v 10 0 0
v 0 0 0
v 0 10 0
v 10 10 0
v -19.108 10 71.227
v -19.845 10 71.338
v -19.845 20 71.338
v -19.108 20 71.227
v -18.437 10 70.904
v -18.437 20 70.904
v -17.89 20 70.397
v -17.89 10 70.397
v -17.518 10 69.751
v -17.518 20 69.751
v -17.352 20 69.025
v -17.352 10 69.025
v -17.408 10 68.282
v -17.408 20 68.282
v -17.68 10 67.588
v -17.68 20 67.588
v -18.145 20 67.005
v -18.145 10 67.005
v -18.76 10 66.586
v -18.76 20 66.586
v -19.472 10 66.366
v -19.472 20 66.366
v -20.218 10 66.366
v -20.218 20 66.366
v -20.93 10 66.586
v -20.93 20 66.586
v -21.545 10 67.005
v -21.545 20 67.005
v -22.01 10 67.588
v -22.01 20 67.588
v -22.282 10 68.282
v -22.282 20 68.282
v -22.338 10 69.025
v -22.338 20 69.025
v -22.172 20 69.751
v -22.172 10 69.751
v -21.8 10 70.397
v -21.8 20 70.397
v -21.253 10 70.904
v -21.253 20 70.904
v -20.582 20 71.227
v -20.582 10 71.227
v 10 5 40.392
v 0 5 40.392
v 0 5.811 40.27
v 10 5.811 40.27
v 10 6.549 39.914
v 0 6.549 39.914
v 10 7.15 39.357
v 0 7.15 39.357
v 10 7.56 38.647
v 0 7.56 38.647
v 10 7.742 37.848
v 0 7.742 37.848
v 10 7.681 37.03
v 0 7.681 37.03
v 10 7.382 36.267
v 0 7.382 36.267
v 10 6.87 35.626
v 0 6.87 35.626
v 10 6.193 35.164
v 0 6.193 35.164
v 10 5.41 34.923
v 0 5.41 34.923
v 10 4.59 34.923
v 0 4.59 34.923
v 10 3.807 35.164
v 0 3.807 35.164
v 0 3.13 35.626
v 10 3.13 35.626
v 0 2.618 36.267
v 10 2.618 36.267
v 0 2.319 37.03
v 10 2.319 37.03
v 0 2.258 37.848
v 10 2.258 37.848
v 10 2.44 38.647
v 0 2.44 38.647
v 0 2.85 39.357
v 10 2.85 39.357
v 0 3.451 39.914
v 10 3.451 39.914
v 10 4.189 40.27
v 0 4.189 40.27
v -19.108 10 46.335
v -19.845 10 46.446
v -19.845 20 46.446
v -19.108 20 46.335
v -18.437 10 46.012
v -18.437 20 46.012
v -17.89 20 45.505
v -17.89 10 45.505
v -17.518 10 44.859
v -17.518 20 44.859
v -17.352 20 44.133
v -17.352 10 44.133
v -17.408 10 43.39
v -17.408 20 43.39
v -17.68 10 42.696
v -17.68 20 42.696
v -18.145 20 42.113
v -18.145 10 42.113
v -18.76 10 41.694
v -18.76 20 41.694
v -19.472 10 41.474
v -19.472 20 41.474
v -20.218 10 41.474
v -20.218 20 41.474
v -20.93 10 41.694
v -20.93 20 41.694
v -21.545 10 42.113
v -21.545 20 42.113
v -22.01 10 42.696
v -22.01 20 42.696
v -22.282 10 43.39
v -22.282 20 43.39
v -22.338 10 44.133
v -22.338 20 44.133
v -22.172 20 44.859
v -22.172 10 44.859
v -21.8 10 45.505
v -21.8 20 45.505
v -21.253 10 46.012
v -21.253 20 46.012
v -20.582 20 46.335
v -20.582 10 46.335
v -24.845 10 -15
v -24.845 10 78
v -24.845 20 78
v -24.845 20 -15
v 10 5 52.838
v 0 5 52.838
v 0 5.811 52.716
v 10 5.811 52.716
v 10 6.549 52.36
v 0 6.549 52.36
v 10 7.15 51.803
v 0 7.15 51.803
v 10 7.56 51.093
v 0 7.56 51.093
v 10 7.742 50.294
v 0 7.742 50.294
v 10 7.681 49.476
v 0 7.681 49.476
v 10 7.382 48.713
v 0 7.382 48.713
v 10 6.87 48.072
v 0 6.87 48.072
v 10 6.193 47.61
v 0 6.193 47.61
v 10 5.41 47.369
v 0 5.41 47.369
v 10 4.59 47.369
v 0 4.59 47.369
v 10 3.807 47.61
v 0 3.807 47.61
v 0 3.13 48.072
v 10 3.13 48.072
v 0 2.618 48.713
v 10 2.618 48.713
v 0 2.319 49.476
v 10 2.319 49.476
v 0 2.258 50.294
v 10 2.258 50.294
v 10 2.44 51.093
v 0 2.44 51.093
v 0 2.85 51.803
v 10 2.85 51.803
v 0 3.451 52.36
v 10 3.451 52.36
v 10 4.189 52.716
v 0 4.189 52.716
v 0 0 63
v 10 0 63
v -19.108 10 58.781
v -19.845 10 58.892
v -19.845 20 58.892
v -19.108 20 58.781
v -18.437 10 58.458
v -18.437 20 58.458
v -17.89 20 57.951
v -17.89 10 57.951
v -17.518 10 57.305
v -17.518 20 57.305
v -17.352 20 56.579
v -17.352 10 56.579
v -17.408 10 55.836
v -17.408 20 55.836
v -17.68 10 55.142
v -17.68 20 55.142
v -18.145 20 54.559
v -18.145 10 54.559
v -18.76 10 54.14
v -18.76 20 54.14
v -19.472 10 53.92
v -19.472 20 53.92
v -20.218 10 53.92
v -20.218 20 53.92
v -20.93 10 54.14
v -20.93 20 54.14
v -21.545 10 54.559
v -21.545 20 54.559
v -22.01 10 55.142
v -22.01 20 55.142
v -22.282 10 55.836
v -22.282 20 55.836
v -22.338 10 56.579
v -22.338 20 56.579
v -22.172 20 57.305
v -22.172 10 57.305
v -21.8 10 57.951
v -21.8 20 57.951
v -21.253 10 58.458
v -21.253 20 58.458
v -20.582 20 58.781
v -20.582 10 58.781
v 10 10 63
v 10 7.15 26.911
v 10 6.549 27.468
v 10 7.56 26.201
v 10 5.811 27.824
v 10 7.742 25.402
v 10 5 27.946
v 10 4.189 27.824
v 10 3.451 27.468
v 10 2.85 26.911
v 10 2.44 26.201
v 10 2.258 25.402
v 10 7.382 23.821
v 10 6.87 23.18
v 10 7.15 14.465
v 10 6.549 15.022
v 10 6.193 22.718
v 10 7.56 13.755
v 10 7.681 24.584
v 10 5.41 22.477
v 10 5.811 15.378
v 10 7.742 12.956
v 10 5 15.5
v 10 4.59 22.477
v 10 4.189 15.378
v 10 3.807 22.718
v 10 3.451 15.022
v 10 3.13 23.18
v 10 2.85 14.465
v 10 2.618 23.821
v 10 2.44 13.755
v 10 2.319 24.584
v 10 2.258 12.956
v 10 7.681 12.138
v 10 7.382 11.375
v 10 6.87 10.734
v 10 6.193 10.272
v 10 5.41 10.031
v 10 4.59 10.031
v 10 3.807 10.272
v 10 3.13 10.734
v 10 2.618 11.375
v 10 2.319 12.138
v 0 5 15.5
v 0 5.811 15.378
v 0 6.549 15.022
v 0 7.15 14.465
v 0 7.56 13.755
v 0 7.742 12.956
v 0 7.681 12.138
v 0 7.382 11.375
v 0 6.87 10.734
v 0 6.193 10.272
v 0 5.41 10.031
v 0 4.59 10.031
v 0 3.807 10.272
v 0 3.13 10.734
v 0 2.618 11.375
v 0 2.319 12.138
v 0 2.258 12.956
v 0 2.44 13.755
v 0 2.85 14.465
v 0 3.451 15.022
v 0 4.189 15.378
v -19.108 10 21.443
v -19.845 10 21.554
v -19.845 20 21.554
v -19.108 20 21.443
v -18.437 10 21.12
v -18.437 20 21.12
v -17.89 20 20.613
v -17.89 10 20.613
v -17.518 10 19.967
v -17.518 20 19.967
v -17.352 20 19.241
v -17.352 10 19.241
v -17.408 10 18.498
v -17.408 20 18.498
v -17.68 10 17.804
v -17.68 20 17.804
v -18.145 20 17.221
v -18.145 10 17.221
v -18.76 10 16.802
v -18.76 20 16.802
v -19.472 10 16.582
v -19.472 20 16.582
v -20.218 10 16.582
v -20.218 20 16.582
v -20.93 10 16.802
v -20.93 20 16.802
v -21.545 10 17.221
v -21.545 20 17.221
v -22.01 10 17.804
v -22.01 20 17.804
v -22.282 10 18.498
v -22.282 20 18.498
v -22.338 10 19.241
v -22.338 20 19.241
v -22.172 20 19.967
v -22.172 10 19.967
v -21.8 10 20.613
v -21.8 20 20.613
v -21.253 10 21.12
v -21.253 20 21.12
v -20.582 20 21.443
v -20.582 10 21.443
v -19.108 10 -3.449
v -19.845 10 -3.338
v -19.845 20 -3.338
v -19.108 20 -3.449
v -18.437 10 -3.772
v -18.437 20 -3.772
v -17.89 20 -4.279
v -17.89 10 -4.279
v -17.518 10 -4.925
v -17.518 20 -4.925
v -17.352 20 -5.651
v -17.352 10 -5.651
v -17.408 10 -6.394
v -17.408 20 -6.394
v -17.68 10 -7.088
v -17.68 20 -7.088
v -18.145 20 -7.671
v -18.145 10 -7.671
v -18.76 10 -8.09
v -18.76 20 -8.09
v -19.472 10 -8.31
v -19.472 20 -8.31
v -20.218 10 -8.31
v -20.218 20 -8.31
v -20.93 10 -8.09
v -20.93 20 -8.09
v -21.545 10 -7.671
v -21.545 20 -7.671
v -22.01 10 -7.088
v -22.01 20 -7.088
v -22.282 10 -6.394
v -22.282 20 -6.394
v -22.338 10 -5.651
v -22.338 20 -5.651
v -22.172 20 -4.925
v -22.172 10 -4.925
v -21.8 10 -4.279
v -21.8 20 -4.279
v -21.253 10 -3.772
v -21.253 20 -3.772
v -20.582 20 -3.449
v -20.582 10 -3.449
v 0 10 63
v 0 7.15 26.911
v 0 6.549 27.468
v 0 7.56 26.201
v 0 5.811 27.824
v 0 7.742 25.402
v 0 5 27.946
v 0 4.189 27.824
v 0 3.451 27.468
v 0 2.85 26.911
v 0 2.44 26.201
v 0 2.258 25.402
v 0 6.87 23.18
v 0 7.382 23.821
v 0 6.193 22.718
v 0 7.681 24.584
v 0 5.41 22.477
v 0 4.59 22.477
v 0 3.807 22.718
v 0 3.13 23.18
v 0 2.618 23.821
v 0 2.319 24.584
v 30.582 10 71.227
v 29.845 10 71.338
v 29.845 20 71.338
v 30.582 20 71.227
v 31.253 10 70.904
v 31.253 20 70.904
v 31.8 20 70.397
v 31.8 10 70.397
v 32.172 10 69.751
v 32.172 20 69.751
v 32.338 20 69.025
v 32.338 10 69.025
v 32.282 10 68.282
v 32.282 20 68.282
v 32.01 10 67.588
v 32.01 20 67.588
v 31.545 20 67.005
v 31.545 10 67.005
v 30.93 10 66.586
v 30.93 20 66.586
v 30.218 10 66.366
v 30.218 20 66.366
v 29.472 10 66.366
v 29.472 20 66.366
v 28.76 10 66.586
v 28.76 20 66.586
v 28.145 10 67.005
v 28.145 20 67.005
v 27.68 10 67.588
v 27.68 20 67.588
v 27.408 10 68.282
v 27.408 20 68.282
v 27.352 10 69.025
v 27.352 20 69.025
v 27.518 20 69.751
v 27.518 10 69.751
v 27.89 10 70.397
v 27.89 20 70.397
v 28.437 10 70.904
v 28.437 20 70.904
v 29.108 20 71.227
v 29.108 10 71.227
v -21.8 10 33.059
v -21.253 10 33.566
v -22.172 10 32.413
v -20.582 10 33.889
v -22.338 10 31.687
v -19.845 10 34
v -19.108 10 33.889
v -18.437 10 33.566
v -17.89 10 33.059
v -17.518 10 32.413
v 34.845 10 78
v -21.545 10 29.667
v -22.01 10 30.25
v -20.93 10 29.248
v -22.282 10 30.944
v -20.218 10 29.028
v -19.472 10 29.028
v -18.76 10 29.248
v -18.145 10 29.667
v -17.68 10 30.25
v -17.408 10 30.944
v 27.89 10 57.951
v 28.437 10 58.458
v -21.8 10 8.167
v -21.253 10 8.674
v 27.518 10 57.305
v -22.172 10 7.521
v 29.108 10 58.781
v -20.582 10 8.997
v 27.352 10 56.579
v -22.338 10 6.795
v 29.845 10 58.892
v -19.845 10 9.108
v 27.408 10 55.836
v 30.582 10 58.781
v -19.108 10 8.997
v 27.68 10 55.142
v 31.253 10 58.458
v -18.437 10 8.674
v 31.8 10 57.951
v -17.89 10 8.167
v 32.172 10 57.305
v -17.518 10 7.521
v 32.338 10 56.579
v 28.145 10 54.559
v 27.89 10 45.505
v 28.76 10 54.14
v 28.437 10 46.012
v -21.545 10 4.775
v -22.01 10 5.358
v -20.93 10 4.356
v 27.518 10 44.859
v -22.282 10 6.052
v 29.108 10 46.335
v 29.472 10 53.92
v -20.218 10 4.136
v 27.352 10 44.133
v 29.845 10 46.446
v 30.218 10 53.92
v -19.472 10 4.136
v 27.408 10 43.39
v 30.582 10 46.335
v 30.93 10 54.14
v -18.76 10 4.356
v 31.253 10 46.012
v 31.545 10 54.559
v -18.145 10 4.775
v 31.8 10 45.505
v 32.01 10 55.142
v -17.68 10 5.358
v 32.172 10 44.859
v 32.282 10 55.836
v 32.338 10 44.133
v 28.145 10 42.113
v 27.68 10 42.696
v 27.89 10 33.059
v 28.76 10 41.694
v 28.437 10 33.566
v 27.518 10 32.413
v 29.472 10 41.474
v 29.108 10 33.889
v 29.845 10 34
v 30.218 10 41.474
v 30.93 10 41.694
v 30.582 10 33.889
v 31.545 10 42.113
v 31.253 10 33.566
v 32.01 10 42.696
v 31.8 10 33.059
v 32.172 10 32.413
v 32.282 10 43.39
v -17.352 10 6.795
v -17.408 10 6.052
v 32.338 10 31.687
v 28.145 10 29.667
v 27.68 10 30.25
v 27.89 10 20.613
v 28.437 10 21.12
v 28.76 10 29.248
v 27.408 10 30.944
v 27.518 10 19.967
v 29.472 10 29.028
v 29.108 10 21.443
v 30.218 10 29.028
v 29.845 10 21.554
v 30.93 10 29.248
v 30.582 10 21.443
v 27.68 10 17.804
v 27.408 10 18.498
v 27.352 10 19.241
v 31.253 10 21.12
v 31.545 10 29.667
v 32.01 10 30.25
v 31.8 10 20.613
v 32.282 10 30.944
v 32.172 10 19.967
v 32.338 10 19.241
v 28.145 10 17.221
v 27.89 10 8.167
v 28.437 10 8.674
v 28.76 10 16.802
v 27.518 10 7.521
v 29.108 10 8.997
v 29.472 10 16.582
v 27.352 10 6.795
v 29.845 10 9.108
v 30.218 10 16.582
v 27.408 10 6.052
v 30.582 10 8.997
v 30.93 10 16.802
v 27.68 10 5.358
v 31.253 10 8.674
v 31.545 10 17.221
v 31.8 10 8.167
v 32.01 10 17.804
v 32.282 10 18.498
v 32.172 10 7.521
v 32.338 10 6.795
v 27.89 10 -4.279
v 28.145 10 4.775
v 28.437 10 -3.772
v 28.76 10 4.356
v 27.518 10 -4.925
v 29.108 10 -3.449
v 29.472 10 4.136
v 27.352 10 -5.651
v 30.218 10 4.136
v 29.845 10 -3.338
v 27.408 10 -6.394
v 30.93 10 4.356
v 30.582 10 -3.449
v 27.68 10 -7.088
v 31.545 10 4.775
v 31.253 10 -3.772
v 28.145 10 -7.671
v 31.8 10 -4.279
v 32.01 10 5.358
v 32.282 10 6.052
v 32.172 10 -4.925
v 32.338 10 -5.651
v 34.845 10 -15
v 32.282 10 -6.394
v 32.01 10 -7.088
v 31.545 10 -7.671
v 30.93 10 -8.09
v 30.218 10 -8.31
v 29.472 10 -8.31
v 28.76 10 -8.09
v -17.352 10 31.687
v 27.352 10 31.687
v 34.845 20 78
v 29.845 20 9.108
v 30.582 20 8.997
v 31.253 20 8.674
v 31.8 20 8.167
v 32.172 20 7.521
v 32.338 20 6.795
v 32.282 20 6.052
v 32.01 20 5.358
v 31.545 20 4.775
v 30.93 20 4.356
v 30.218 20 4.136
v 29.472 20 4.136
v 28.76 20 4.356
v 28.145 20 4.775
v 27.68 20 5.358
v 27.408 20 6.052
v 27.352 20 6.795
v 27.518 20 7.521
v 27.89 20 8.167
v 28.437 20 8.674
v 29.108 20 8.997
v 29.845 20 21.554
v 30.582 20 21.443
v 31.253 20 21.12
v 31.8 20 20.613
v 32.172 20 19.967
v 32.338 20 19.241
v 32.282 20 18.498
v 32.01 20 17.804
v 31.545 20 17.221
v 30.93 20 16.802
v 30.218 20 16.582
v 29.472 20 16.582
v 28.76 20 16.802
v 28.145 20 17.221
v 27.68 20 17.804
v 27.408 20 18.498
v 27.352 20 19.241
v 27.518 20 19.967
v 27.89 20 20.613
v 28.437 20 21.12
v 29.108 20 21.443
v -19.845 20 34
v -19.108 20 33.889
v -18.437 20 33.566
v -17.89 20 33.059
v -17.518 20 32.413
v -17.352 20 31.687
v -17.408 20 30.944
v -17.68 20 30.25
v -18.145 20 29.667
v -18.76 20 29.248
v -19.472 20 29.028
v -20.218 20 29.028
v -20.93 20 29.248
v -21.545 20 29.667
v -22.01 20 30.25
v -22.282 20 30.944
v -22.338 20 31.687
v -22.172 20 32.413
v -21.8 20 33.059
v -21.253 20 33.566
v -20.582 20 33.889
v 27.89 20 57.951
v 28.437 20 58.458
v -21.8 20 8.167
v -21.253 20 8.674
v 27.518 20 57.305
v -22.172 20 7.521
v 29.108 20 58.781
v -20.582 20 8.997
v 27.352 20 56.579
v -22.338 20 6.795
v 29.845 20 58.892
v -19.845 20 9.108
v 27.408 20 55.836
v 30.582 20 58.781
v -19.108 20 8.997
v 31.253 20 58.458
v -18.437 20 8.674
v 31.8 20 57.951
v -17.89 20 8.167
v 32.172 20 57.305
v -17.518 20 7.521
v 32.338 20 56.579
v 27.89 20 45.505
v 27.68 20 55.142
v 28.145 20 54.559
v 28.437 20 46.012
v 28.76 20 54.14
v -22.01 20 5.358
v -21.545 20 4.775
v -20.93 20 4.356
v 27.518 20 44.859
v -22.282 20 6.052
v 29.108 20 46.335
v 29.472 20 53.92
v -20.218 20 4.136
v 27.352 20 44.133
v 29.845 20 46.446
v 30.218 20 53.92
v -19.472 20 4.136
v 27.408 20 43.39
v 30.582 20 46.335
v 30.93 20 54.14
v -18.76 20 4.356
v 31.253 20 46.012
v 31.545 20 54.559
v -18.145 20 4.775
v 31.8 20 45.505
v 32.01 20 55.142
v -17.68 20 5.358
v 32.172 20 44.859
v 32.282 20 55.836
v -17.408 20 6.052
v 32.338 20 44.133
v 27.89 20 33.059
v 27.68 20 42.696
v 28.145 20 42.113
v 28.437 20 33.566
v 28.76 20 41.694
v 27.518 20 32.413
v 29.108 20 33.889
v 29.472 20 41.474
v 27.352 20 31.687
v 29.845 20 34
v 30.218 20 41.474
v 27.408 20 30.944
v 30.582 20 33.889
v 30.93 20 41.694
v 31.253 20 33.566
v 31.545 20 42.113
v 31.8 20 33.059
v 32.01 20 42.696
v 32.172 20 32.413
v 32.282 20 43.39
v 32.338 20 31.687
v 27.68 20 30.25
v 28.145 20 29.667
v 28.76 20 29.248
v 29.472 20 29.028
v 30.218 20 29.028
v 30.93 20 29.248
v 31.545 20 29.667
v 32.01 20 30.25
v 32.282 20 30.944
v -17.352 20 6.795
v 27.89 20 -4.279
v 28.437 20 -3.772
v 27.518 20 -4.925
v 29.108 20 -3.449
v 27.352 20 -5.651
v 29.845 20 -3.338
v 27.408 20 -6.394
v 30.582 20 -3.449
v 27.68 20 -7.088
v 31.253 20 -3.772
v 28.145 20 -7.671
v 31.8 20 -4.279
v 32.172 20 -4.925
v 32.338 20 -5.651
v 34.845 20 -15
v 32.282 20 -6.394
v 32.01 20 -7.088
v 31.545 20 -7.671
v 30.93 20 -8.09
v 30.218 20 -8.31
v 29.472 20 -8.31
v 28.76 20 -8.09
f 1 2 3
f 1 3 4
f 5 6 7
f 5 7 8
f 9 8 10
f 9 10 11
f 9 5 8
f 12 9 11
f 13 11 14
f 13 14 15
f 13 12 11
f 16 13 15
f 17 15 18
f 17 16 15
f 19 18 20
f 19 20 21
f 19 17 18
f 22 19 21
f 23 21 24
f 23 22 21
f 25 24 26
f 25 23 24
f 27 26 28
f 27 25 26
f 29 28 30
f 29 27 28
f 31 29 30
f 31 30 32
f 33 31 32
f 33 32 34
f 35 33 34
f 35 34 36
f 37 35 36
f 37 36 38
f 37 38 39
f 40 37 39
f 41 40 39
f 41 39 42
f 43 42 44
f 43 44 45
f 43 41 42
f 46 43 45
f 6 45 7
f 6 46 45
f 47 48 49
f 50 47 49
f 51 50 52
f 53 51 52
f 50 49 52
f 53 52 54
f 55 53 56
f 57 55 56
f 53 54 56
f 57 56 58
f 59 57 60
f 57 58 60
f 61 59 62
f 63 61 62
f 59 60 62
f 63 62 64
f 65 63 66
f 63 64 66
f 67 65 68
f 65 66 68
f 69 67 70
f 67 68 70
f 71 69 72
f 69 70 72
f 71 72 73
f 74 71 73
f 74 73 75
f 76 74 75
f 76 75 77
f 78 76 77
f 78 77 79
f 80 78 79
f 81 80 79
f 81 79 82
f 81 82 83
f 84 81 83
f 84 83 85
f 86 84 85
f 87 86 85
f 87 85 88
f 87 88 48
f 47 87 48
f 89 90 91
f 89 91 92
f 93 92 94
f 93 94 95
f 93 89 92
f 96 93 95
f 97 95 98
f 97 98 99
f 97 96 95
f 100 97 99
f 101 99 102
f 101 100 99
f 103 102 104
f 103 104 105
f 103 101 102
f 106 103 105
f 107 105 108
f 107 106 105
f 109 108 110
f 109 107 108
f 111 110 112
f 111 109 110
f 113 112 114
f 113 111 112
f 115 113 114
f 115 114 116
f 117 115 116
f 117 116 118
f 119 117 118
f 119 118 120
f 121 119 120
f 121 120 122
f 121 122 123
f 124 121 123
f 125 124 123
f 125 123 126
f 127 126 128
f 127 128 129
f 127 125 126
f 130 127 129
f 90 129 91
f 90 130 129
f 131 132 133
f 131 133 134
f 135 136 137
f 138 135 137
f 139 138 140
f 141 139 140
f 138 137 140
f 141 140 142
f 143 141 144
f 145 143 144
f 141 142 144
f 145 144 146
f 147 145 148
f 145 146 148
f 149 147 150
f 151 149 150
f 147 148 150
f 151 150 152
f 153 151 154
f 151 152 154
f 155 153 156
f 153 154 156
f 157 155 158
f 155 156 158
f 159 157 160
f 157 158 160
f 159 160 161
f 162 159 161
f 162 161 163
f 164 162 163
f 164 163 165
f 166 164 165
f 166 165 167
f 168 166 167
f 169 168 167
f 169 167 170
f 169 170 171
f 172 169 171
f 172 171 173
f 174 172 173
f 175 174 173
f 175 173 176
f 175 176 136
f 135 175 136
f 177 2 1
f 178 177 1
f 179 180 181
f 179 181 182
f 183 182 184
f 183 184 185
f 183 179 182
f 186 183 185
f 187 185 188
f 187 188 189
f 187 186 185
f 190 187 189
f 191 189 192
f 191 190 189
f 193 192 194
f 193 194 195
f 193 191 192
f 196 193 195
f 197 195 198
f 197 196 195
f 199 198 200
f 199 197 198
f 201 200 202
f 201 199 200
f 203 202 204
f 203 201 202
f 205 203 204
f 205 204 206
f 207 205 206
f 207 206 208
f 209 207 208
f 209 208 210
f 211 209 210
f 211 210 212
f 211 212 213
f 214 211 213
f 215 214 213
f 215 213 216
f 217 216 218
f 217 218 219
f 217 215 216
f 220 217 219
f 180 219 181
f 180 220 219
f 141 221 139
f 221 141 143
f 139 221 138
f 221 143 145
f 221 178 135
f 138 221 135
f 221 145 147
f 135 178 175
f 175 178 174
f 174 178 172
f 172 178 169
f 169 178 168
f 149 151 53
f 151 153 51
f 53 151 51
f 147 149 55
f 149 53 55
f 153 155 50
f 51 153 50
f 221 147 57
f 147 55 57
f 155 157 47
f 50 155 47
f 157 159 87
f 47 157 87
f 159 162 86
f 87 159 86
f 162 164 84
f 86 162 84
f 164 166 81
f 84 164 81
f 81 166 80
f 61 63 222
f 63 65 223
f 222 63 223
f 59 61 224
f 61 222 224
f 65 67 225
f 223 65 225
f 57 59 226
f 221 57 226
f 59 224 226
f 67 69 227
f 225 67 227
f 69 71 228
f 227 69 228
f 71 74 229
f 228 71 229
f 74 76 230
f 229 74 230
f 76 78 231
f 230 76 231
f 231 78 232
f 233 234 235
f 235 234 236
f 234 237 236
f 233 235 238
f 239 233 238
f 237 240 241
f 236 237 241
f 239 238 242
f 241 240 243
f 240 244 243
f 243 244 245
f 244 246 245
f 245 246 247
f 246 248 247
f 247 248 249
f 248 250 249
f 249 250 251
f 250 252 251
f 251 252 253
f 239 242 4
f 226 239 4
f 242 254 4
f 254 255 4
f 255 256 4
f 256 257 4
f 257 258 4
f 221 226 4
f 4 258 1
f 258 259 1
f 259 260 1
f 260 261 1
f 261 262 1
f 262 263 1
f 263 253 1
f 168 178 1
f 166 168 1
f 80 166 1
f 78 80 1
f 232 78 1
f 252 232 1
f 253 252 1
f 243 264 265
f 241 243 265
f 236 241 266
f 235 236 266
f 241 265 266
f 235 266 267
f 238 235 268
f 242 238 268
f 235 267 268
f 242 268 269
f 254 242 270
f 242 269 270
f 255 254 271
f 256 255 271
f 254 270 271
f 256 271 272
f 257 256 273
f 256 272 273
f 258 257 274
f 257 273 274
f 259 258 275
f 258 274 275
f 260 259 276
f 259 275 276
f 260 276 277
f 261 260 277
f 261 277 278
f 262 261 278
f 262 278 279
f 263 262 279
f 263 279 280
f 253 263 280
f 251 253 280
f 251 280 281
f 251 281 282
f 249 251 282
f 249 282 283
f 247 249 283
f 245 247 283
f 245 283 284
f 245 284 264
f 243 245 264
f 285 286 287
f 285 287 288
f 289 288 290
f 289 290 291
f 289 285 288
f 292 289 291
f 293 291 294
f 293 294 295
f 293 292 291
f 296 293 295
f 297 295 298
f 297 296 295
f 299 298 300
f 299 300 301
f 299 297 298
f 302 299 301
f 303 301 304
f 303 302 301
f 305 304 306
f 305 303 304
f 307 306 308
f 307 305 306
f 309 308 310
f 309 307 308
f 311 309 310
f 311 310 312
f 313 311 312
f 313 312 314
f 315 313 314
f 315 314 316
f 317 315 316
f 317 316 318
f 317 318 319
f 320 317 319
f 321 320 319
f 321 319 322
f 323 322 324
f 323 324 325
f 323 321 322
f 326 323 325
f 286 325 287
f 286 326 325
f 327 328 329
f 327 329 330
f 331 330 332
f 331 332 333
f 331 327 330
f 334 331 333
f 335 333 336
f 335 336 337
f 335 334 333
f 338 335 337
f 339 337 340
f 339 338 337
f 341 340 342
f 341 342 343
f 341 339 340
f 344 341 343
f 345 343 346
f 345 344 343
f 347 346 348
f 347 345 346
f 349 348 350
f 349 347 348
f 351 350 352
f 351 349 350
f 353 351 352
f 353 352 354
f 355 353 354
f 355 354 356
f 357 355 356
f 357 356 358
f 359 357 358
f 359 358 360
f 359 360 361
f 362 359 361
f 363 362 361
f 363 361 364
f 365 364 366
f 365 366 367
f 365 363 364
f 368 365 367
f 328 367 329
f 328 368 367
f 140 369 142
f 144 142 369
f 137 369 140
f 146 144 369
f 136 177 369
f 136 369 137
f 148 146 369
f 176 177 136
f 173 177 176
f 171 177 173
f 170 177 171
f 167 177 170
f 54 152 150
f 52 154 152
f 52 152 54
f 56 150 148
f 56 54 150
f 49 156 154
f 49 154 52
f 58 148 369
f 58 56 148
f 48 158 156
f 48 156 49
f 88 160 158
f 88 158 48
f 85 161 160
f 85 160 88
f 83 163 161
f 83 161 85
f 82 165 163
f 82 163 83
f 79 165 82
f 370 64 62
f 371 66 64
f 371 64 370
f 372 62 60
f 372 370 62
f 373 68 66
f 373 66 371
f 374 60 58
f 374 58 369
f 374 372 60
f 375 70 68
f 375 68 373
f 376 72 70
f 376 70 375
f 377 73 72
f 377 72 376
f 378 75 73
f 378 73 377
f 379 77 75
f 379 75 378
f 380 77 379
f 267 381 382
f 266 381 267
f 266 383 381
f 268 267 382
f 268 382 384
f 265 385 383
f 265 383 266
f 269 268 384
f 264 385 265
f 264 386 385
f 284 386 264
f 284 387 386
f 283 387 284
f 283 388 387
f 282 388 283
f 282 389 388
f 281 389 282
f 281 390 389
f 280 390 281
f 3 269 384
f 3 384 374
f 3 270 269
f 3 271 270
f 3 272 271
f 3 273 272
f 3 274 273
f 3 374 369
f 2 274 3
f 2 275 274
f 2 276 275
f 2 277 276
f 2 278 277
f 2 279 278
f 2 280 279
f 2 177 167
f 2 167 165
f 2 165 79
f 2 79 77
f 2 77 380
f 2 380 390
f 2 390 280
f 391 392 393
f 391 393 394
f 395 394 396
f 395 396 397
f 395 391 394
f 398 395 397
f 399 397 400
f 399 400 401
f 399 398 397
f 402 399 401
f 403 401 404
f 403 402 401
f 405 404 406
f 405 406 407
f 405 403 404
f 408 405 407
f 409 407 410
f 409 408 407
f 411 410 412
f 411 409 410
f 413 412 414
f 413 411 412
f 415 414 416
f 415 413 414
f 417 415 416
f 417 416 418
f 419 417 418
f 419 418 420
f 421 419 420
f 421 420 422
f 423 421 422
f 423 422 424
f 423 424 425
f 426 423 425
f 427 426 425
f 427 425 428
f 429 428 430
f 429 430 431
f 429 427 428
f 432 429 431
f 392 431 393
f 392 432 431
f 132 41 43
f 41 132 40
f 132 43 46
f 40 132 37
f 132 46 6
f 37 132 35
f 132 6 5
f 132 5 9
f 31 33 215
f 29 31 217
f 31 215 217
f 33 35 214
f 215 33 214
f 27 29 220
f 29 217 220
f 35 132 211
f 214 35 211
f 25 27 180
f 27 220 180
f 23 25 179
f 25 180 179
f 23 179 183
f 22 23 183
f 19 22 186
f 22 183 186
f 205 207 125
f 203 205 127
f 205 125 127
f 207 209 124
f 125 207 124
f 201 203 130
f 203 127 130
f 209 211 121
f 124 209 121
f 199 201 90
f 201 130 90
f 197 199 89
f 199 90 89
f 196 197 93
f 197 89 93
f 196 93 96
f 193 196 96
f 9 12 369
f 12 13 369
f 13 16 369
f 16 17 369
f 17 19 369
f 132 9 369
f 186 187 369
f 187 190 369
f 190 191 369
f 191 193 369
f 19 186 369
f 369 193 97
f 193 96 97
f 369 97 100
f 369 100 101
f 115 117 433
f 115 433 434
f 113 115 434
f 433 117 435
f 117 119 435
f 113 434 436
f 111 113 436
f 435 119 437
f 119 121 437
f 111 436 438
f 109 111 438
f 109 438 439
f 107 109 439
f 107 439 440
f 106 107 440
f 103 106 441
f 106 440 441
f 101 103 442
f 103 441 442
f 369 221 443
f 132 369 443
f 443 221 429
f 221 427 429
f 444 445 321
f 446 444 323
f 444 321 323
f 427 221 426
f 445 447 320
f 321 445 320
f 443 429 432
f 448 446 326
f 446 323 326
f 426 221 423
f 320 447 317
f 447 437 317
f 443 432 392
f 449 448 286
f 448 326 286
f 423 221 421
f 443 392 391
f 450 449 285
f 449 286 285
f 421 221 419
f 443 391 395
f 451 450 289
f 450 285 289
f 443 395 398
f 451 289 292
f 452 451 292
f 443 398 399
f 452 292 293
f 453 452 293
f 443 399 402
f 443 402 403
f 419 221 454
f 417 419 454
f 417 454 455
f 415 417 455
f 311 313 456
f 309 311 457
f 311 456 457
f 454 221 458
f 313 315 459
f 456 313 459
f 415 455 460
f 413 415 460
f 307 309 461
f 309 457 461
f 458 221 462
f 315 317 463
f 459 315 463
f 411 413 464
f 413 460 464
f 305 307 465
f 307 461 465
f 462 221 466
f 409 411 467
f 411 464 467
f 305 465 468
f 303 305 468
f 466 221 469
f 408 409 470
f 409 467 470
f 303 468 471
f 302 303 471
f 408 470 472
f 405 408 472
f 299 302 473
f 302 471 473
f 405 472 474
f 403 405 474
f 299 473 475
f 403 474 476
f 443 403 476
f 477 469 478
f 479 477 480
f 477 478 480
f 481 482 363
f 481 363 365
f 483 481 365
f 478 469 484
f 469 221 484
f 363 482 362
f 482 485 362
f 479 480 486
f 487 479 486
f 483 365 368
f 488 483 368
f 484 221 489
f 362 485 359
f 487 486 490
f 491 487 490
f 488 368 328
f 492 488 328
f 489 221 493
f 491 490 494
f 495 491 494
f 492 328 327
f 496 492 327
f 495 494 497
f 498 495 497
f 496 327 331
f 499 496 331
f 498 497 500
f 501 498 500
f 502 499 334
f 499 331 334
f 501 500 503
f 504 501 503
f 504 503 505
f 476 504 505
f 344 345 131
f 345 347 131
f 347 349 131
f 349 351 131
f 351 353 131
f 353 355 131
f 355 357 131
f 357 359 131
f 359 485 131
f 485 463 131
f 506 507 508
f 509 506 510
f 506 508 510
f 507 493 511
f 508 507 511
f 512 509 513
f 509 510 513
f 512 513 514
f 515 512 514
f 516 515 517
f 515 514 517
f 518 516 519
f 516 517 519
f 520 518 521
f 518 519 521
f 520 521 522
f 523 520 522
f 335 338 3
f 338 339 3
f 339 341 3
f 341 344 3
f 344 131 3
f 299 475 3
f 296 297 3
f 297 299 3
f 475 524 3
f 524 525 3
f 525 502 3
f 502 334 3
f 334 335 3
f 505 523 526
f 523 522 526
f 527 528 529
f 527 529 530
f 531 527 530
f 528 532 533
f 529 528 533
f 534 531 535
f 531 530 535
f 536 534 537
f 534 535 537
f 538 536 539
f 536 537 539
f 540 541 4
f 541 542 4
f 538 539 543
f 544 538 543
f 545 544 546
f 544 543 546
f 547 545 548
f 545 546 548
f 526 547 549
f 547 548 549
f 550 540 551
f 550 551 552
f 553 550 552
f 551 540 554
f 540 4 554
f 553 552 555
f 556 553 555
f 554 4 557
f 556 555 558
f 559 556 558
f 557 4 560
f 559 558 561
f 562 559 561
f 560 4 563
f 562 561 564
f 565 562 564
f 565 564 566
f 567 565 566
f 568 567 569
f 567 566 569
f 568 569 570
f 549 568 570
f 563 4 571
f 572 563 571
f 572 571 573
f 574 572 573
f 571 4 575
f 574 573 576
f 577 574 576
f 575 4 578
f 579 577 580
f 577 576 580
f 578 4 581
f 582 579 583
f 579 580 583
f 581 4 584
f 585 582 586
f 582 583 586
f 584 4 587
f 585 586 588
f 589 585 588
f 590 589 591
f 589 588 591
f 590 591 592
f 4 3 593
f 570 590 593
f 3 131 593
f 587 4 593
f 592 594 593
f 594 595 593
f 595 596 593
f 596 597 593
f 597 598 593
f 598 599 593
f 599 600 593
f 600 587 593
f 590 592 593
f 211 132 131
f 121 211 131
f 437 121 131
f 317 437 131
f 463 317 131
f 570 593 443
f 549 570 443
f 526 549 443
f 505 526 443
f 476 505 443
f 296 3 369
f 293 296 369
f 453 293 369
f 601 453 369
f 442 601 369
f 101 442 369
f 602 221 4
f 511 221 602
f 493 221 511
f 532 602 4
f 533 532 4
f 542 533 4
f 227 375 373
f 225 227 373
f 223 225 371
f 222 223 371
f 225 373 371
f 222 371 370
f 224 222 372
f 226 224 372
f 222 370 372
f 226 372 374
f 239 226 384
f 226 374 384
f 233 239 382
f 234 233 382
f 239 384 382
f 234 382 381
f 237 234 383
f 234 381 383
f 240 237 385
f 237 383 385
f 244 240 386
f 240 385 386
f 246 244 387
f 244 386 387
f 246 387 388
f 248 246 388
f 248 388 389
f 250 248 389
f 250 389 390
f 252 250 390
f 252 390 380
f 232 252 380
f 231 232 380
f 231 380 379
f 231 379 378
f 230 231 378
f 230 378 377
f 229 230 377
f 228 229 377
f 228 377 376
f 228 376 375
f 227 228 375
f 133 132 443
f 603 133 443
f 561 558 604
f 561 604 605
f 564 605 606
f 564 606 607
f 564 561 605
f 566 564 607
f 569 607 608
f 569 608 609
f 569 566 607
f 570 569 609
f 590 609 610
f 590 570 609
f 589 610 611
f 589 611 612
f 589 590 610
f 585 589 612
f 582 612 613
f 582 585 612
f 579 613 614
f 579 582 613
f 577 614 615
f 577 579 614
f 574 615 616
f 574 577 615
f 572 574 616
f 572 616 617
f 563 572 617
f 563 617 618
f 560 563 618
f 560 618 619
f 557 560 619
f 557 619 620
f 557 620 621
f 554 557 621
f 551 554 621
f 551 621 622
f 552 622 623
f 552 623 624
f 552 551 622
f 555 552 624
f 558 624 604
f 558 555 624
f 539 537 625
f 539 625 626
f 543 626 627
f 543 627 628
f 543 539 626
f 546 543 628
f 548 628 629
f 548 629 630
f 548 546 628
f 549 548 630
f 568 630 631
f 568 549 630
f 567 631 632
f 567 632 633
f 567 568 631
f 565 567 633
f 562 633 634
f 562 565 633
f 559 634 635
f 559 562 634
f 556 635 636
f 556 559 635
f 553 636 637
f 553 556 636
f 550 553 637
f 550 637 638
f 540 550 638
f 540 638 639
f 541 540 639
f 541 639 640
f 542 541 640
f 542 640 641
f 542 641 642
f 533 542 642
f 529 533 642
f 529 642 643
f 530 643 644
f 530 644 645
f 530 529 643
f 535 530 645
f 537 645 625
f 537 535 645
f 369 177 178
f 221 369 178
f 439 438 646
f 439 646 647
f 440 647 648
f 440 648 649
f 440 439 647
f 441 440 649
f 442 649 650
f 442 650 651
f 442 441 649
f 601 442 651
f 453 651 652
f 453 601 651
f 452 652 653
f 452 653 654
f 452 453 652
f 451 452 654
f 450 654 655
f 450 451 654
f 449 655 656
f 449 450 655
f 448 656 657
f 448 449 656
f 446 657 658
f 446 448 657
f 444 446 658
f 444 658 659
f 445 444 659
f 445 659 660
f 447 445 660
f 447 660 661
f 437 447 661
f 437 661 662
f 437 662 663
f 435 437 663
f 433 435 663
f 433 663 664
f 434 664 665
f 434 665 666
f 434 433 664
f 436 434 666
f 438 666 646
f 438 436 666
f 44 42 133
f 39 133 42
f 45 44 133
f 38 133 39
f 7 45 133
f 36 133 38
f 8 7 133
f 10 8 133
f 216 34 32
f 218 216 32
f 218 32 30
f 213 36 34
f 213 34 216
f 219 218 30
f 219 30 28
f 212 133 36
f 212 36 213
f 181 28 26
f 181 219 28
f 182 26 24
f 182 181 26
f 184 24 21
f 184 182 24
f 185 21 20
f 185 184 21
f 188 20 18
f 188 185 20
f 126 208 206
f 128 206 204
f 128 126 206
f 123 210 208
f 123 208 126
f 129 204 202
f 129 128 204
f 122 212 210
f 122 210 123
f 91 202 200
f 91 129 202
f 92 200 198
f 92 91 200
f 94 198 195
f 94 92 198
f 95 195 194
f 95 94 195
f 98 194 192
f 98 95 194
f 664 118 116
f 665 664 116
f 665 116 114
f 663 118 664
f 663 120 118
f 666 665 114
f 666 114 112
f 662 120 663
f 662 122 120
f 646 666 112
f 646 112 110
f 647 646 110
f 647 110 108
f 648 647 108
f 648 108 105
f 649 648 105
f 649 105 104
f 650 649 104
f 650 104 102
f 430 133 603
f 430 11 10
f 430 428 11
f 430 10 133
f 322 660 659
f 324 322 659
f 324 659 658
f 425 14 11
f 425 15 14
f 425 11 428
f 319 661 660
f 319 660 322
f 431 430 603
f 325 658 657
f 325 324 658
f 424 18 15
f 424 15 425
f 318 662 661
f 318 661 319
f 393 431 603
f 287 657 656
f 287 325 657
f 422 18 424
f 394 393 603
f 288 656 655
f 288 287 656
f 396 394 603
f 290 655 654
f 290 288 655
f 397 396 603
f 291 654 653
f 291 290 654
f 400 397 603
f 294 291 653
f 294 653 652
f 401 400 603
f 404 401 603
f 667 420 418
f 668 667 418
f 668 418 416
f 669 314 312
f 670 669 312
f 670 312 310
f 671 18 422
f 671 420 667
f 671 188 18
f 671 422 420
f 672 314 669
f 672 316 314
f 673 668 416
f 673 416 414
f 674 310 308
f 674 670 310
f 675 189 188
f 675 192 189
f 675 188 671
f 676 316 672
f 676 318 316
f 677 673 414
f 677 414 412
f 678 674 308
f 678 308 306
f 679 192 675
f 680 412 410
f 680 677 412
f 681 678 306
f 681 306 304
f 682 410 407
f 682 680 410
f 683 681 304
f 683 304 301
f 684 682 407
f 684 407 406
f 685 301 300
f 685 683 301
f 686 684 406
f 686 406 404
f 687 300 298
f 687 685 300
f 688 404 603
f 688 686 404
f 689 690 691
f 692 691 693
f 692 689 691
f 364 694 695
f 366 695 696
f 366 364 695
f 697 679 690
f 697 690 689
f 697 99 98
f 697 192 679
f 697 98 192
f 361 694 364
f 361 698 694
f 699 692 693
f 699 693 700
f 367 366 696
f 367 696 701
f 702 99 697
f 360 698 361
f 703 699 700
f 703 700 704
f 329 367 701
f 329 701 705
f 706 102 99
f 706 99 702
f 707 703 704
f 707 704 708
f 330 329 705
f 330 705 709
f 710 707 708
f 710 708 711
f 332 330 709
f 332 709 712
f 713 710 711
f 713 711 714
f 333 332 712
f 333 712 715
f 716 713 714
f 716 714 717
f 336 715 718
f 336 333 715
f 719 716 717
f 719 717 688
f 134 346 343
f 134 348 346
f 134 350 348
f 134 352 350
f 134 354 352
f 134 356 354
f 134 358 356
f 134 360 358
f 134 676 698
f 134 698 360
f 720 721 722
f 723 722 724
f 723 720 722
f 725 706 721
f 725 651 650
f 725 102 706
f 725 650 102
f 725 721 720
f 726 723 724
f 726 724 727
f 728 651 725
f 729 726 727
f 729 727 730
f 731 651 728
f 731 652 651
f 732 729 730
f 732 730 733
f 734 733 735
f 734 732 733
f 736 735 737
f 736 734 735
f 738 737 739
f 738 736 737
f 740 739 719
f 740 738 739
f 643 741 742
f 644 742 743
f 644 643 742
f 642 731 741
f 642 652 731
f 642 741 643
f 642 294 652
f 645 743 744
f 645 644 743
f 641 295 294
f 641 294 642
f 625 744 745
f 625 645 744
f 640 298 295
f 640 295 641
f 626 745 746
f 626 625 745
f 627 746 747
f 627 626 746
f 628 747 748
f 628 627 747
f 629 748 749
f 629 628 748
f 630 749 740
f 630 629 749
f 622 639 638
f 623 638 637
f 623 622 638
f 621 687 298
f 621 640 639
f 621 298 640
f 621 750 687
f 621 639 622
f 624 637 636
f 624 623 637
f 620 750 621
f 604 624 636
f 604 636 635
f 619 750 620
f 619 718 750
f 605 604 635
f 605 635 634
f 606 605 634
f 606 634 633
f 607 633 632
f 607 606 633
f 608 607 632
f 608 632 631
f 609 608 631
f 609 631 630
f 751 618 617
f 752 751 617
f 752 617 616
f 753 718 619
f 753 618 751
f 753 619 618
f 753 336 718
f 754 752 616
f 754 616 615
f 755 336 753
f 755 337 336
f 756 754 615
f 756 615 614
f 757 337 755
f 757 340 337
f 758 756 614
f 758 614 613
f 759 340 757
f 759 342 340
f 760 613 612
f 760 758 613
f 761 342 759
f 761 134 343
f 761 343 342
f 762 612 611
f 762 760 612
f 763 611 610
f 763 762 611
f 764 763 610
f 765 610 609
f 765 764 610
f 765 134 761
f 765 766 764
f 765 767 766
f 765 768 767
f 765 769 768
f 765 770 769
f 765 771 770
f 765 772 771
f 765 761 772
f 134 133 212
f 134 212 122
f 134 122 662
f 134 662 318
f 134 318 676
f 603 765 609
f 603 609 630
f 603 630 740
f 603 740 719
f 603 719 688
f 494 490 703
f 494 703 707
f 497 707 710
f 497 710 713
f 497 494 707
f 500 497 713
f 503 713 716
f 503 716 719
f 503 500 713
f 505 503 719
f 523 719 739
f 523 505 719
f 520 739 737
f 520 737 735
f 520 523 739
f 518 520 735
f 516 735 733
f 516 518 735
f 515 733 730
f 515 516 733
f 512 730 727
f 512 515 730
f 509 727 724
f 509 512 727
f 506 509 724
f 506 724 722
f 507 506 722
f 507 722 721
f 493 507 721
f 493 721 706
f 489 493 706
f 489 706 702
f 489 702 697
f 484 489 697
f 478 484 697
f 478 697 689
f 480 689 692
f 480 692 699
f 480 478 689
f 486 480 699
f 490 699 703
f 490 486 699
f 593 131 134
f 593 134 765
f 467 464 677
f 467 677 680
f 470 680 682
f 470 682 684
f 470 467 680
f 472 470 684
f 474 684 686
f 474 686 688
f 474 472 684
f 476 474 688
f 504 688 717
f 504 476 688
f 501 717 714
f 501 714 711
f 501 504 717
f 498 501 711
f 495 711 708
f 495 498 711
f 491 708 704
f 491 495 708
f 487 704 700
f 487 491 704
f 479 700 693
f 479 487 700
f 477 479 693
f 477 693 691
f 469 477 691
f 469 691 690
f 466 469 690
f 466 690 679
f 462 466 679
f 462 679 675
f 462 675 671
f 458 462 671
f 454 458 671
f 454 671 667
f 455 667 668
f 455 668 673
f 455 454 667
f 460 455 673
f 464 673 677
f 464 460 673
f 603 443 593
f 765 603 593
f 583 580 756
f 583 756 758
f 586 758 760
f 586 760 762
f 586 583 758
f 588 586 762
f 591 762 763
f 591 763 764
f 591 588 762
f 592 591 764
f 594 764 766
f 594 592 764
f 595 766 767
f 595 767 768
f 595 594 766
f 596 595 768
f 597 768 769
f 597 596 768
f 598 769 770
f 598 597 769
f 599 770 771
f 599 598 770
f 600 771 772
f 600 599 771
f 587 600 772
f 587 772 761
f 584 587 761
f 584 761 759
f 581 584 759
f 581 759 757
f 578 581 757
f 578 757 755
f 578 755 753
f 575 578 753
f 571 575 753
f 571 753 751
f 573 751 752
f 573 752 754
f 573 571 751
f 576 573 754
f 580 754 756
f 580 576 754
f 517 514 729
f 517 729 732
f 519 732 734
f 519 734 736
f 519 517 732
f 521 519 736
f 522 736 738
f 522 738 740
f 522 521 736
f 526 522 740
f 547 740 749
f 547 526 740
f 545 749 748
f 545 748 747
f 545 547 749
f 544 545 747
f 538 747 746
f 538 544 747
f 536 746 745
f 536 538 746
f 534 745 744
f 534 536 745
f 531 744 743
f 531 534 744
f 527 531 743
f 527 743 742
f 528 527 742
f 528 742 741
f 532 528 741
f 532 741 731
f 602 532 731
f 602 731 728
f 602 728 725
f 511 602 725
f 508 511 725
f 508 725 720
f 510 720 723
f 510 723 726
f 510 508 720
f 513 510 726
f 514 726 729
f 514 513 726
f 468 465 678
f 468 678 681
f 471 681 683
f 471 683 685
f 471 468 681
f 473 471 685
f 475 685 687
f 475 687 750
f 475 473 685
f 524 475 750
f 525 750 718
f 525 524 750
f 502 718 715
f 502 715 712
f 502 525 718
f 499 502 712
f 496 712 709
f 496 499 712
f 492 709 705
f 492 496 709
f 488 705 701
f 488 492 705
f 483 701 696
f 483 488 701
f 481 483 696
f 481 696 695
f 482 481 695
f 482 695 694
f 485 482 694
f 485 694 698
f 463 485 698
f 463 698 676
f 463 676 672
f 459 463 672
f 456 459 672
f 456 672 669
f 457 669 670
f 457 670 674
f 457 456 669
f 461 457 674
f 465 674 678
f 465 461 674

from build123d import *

# Parameters (mm, degrees)
SKETCH1_W           = 10
SKETCH1_H           = 63
BOSS_EXTRUDE1_DEPTH = 10
SKETCH2_W           = 59.69
SKETCH2_H           = 93
SKETCH2_R           = 2.5
BOSS_EXTRUDE2_DEPTH = 10
SKETCH3_R           = 2.75
CUT_EXTRUDE1_DEPTH  = 88.739238799


with BuildPart() as part:
    # Sketch1 → Boss-Extrude1 (new body)
    with BuildSketch(Plane(origin=(0, 0, 0), x_dir=(1, 0, 0), z_dir=(0, 1, 0))):
        with Locations((5, -31.5)):
            Rectangle(SKETCH1_W, SKETCH1_H)
    extrude(amount=BOSS_EXTRUDE1_DEPTH)

    # Sketch2 → Boss-Extrude2 (add)
    with BuildSketch(Plane(origin=(0, 10, 0), x_dir=(1, 0, 0), z_dir=(0, 1, 0))):
        with Locations((5, -31.5)):
            Rectangle(SKETCH2_W, SKETCH2_H)
        with Locations(Location((-19.845, 5.838000036, 0), (0, 0, 270))):
            Circle(SKETCH2_R, mode=Mode.SUBTRACT)
        with Locations(Location((-19.845, -6.607999964, 0), (0, 0, 270))):
            Circle(SKETCH2_R, mode=Mode.SUBTRACT)
        with Locations(Location((-19.845, -19.053999964, 0), (0, 0, 270))):
            Circle(SKETCH2_R, mode=Mode.SUBTRACT)
        with Locations(Location((-19.845, -31.499999964, 0), (0, 0, 270))):
            Circle(SKETCH2_R, mode=Mode.SUBTRACT)
        with Locations(Location((-19.845, -43.945999964, 0), (0, 0, 270))):
            Circle(SKETCH2_R, mode=Mode.SUBTRACT)
        with Locations(Location((-19.845, -56.391999964, 0), (0, 0, 270))):
            Circle(SKETCH2_R, mode=Mode.SUBTRACT)
        with Locations(Location((-19.845, -68.837999964, 0), (0, 0, 270))):
            Circle(SKETCH2_R, mode=Mode.SUBTRACT)
        with Locations(Location((29.845, 5.838000036, 0), (0, 0, 270))):
            Circle(SKETCH2_R, mode=Mode.SUBTRACT)
        with Locations(Location((29.845, -6.607999964, 0), (0, 0, 270))):
            Circle(SKETCH2_R, mode=Mode.SUBTRACT)
        with Locations(Location((29.845, -19.053999964, 0), (0, 0, 270))):
            Circle(SKETCH2_R, mode=Mode.SUBTRACT)
        with Locations(Location((29.845, -31.499999964, 0), (0, 0, 270))):
            Circle(SKETCH2_R, mode=Mode.SUBTRACT)
        with Locations(Location((29.845, -43.945999964, 0), (0, 0, 270))):
            Circle(SKETCH2_R, mode=Mode.SUBTRACT)
        with Locations(Location((29.845, -56.391999964, 0), (0, 0, 270))):
            Circle(SKETCH2_R, mode=Mode.SUBTRACT)
        with Locations(Location((29.845, -68.837999964, 0), (0, 0, 270))):
            Circle(SKETCH2_R, mode=Mode.SUBTRACT)
    extrude(amount=BOSS_EXTRUDE2_DEPTH)

    # Sketch3 → Cut-Extrude1 (cut, through all)
    with BuildSketch(Plane.ZY):
        with Locations((12.75, 5)):
            Circle(SKETCH3_R)
        with Locations((25.196, 5)):
            Circle(SKETCH3_R)
        with Locations((37.642, 5)):
            Circle(SKETCH3_R)
        with Locations((50.088, 5)):
            Circle(SKETCH3_R)
    extrude(amount=-CUT_EXTRUDE1_DEPTH, mode=Mode.SUBTRACT)


solid = part.part
